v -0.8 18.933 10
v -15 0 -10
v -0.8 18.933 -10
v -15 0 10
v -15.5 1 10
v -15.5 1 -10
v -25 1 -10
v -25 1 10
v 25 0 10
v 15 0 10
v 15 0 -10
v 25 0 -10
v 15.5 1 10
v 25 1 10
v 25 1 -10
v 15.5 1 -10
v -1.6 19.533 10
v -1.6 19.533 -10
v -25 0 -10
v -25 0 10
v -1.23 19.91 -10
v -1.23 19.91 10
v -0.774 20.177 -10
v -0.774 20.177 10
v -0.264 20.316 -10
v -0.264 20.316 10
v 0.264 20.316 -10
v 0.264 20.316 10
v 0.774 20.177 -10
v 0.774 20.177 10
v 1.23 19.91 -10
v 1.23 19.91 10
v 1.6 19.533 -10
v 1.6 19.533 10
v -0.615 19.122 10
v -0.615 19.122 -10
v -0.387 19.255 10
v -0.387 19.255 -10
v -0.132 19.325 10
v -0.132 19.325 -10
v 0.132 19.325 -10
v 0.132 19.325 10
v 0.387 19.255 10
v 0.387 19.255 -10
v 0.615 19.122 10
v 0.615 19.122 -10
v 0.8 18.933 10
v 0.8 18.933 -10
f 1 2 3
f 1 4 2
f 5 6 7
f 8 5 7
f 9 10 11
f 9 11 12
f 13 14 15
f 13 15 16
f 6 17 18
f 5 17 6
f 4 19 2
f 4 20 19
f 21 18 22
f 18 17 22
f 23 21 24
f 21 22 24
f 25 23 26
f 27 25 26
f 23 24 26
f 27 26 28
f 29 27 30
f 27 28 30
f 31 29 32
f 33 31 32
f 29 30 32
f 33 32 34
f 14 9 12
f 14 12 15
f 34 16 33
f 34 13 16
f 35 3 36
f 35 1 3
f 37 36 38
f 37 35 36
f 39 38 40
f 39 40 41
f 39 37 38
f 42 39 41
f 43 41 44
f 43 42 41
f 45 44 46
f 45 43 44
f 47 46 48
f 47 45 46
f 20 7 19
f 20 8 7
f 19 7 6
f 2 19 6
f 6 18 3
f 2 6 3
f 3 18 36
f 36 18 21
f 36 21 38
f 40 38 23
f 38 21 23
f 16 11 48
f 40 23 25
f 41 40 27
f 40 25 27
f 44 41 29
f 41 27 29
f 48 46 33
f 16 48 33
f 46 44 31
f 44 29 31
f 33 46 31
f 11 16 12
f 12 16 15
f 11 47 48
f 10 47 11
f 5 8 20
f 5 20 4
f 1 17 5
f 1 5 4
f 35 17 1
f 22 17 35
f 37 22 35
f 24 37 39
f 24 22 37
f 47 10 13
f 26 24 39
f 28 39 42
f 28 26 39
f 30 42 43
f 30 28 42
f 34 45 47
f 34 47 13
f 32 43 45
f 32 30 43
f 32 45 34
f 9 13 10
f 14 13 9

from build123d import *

# Parameters (mm, degrees)
EXTRUDE_1_DEPTH = 10
FILLET_1_R      = 1
FILLET_2_R      = 2


with BuildPart() as part:
    # 草图1 → 凸台-拉伸1 (new body, symmetric)
    with BuildSketch(Plane.XY):
        Polygon((-15, 0), (0, 20), (15, 0), (25, 0), (25, 1), (15.5, 1), (0, 21.666666667), (-15.5, 1), (-25, 1), (-25, 0), align=None)
    extrude(amount=EXTRUDE_1_DEPTH, both=True)

    # 圆角1
    fillet_1_edges = [part.edges().sort_by_distance(p)[0] for p in [
        (0, 20, 0),
    ]]
    fillet(fillet_1_edges, radius=FILLET_1_R)

    # 圆角2
    fillet_2_edges = [part.edges().sort_by_distance(p)[0] for p in [
        (0, 21.666666667, 0),
    ]]
    fillet(fillet_2_edges, radius=FILLET_2_R)


solid = part.part
